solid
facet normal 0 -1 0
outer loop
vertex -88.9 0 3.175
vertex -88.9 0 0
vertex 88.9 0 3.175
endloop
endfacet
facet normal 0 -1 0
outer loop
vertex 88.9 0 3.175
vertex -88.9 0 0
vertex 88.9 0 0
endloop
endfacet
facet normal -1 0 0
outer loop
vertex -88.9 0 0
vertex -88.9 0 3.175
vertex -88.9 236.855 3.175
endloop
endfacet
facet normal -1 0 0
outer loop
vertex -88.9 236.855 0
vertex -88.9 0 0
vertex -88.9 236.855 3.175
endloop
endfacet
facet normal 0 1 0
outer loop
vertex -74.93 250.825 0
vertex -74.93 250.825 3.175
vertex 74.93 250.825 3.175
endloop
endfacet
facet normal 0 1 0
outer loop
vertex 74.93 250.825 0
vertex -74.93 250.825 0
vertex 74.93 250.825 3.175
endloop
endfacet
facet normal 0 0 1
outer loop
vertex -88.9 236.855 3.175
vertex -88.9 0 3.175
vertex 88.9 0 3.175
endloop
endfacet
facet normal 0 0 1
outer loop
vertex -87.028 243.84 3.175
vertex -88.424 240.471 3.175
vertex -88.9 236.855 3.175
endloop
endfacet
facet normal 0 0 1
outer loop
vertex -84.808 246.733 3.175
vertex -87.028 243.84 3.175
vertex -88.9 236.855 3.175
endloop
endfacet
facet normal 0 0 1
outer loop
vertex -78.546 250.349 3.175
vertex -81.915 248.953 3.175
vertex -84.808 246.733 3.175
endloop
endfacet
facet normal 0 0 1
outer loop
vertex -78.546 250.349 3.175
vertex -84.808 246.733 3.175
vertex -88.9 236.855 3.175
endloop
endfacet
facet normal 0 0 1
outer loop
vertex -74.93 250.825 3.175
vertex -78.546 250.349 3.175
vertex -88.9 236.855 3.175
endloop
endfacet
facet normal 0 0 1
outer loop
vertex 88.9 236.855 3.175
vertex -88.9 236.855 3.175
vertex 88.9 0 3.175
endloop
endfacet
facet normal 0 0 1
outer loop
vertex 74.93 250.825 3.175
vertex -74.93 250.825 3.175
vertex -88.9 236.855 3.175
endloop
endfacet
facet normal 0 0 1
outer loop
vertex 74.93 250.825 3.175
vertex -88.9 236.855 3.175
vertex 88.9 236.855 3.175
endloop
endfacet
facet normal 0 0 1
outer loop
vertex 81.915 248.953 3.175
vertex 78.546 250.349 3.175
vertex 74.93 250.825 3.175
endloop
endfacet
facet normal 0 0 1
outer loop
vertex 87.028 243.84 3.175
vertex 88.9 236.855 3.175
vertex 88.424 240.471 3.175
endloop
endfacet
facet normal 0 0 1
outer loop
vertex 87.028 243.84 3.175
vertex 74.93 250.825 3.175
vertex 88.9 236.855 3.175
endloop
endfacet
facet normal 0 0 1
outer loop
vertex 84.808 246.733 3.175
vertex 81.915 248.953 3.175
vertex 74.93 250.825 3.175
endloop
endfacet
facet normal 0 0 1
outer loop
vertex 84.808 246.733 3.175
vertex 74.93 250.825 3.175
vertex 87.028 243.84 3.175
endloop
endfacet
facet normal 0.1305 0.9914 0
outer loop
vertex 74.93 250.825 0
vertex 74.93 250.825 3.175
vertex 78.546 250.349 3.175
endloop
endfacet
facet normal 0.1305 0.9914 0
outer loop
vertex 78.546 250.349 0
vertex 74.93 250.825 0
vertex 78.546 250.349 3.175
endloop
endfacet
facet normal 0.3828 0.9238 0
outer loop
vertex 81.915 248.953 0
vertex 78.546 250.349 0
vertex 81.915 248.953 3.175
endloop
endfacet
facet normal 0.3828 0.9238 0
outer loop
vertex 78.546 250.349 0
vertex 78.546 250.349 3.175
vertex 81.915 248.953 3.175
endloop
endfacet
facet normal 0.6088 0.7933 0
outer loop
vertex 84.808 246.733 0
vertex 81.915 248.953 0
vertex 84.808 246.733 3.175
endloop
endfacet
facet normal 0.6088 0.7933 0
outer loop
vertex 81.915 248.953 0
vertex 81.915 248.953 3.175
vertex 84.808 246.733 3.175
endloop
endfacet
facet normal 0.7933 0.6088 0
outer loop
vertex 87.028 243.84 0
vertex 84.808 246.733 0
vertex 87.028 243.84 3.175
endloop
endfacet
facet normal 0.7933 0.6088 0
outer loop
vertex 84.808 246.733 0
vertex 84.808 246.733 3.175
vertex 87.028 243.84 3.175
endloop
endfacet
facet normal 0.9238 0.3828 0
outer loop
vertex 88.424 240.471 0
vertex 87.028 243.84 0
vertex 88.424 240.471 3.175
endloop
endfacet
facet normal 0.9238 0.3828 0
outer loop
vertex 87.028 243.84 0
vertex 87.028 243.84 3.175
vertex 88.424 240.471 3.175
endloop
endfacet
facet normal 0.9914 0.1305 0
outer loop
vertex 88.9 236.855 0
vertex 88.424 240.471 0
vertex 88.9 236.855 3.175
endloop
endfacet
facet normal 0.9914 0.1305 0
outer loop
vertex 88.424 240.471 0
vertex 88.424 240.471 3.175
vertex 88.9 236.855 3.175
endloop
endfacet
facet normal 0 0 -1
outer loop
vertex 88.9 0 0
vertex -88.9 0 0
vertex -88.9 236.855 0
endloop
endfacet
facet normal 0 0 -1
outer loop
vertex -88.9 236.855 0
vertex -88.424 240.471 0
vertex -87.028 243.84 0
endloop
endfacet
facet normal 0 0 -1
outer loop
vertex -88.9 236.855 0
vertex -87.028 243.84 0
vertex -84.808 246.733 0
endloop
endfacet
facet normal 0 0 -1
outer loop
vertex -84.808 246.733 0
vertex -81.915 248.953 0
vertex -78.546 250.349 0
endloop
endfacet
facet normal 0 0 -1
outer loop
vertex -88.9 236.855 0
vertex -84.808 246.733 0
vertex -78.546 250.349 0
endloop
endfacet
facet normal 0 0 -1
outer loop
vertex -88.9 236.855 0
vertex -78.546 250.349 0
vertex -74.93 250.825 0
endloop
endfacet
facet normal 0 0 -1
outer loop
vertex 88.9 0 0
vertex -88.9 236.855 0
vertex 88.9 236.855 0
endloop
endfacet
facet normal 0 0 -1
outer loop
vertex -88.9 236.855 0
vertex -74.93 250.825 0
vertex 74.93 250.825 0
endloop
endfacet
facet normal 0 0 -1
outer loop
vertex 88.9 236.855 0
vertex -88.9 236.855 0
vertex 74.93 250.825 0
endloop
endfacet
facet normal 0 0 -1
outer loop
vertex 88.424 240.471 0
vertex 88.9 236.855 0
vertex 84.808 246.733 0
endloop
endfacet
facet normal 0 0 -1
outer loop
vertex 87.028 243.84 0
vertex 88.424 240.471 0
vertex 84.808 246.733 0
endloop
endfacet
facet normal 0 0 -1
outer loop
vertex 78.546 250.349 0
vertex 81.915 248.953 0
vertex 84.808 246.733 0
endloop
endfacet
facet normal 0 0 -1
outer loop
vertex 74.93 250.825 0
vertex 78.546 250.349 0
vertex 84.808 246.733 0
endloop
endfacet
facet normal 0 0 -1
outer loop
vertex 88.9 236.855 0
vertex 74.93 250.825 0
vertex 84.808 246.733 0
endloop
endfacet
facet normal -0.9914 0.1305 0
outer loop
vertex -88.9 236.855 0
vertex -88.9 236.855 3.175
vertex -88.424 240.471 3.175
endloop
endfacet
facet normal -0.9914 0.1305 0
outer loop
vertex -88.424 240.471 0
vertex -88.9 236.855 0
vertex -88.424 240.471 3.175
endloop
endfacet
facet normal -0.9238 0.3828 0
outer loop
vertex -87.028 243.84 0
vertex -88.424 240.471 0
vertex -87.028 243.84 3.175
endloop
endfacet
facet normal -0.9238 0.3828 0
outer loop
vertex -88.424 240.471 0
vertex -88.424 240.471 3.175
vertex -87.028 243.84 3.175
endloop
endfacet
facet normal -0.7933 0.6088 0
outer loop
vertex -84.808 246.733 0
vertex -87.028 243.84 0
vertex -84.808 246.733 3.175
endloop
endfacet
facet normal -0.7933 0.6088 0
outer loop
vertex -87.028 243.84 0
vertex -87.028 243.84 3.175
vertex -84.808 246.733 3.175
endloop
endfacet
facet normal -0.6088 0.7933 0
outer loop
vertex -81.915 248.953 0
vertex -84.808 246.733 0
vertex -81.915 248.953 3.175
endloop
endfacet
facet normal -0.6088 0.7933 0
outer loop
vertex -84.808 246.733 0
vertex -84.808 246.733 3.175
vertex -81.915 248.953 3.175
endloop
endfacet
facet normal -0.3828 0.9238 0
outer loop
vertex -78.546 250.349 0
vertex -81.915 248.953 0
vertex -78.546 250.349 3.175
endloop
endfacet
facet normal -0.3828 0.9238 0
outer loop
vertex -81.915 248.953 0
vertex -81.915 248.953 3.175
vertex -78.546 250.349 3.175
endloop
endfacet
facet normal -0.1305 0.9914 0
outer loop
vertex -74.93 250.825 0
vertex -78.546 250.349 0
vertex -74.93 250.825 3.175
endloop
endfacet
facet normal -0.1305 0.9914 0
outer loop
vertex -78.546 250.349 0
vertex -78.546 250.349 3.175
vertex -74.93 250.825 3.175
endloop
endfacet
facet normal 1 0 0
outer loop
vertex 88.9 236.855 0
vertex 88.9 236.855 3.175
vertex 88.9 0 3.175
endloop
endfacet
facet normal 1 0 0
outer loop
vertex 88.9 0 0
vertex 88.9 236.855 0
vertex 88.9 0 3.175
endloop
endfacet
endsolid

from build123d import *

# Parameters (mm, degrees)
BOSS_EXTRUDE1_DEPTH                 = 3.175
THICKNESS_REDUCTION_FOR_SIDES_DEPTH = 271.192313455


with BuildPart() as part:
    # Sketch2 → Boss-Extrude1 (new body)
    with BuildSketch(Plane.XY):
        with BuildLine():
            Line((-92.075, 0), (92.075, 0))
            Line((92.075, 0), (92.075, 236.855))
            ThreePointArc((92.075, 236.855), (87.053345763, 248.978345763), (74.93, 254))
            Line((74.93, 254), (-74.93, 254))
            ThreePointArc((-74.93, 254), (-87.053345763, 248.978345763), (-92.075, 236.855))
            Line((-92.075, 236.855), (-92.075, 0))
        make_face()
    extrude(amount=BOSS_EXTRUDE1_DEPTH)

    # Sketch4 → Thickness Reduction for sides (cut, through all)
    with BuildSketch(Plane.XY.offset(3.175)):
        with BuildLine():
            ThreePointArc((-74.93, 254), (-87.053345763, 248.978345763), (-92.075, 236.855))
            Line((-92.075, 236.855), (-92.075, 0))
            Line((-92.075, 0), (-88.9, 0))
            Line((-88.9, 0), (-88.9, 236.855))
            ThreePointArc((-88.9, 236.855), (-84.808281733, 246.733281733), (-74.93, 250.825))
            Line((-74.93, 250.825), (74.93, 250.825))
            ThreePointArc((74.93, 250.825), (84.808281733, 246.733281733), (88.9, 236.855))
            Line((88.9, 236.855), (88.9, 0))
            Line((88.9, 0), (92.075, 0))
            Line((92.075, 0), (92.075, 236.855))
            ThreePointArc((92.075, 236.855), (87.053345763, 248.978345763), (74.93, 254))
            Line((74.93, 254), (-74.93, 254))
        make_face()
    extrude(amount=-THICKNESS_REDUCTION_FOR_SIDES_DEPTH, mode=Mode.SUBTRACT)


solid = part.part
